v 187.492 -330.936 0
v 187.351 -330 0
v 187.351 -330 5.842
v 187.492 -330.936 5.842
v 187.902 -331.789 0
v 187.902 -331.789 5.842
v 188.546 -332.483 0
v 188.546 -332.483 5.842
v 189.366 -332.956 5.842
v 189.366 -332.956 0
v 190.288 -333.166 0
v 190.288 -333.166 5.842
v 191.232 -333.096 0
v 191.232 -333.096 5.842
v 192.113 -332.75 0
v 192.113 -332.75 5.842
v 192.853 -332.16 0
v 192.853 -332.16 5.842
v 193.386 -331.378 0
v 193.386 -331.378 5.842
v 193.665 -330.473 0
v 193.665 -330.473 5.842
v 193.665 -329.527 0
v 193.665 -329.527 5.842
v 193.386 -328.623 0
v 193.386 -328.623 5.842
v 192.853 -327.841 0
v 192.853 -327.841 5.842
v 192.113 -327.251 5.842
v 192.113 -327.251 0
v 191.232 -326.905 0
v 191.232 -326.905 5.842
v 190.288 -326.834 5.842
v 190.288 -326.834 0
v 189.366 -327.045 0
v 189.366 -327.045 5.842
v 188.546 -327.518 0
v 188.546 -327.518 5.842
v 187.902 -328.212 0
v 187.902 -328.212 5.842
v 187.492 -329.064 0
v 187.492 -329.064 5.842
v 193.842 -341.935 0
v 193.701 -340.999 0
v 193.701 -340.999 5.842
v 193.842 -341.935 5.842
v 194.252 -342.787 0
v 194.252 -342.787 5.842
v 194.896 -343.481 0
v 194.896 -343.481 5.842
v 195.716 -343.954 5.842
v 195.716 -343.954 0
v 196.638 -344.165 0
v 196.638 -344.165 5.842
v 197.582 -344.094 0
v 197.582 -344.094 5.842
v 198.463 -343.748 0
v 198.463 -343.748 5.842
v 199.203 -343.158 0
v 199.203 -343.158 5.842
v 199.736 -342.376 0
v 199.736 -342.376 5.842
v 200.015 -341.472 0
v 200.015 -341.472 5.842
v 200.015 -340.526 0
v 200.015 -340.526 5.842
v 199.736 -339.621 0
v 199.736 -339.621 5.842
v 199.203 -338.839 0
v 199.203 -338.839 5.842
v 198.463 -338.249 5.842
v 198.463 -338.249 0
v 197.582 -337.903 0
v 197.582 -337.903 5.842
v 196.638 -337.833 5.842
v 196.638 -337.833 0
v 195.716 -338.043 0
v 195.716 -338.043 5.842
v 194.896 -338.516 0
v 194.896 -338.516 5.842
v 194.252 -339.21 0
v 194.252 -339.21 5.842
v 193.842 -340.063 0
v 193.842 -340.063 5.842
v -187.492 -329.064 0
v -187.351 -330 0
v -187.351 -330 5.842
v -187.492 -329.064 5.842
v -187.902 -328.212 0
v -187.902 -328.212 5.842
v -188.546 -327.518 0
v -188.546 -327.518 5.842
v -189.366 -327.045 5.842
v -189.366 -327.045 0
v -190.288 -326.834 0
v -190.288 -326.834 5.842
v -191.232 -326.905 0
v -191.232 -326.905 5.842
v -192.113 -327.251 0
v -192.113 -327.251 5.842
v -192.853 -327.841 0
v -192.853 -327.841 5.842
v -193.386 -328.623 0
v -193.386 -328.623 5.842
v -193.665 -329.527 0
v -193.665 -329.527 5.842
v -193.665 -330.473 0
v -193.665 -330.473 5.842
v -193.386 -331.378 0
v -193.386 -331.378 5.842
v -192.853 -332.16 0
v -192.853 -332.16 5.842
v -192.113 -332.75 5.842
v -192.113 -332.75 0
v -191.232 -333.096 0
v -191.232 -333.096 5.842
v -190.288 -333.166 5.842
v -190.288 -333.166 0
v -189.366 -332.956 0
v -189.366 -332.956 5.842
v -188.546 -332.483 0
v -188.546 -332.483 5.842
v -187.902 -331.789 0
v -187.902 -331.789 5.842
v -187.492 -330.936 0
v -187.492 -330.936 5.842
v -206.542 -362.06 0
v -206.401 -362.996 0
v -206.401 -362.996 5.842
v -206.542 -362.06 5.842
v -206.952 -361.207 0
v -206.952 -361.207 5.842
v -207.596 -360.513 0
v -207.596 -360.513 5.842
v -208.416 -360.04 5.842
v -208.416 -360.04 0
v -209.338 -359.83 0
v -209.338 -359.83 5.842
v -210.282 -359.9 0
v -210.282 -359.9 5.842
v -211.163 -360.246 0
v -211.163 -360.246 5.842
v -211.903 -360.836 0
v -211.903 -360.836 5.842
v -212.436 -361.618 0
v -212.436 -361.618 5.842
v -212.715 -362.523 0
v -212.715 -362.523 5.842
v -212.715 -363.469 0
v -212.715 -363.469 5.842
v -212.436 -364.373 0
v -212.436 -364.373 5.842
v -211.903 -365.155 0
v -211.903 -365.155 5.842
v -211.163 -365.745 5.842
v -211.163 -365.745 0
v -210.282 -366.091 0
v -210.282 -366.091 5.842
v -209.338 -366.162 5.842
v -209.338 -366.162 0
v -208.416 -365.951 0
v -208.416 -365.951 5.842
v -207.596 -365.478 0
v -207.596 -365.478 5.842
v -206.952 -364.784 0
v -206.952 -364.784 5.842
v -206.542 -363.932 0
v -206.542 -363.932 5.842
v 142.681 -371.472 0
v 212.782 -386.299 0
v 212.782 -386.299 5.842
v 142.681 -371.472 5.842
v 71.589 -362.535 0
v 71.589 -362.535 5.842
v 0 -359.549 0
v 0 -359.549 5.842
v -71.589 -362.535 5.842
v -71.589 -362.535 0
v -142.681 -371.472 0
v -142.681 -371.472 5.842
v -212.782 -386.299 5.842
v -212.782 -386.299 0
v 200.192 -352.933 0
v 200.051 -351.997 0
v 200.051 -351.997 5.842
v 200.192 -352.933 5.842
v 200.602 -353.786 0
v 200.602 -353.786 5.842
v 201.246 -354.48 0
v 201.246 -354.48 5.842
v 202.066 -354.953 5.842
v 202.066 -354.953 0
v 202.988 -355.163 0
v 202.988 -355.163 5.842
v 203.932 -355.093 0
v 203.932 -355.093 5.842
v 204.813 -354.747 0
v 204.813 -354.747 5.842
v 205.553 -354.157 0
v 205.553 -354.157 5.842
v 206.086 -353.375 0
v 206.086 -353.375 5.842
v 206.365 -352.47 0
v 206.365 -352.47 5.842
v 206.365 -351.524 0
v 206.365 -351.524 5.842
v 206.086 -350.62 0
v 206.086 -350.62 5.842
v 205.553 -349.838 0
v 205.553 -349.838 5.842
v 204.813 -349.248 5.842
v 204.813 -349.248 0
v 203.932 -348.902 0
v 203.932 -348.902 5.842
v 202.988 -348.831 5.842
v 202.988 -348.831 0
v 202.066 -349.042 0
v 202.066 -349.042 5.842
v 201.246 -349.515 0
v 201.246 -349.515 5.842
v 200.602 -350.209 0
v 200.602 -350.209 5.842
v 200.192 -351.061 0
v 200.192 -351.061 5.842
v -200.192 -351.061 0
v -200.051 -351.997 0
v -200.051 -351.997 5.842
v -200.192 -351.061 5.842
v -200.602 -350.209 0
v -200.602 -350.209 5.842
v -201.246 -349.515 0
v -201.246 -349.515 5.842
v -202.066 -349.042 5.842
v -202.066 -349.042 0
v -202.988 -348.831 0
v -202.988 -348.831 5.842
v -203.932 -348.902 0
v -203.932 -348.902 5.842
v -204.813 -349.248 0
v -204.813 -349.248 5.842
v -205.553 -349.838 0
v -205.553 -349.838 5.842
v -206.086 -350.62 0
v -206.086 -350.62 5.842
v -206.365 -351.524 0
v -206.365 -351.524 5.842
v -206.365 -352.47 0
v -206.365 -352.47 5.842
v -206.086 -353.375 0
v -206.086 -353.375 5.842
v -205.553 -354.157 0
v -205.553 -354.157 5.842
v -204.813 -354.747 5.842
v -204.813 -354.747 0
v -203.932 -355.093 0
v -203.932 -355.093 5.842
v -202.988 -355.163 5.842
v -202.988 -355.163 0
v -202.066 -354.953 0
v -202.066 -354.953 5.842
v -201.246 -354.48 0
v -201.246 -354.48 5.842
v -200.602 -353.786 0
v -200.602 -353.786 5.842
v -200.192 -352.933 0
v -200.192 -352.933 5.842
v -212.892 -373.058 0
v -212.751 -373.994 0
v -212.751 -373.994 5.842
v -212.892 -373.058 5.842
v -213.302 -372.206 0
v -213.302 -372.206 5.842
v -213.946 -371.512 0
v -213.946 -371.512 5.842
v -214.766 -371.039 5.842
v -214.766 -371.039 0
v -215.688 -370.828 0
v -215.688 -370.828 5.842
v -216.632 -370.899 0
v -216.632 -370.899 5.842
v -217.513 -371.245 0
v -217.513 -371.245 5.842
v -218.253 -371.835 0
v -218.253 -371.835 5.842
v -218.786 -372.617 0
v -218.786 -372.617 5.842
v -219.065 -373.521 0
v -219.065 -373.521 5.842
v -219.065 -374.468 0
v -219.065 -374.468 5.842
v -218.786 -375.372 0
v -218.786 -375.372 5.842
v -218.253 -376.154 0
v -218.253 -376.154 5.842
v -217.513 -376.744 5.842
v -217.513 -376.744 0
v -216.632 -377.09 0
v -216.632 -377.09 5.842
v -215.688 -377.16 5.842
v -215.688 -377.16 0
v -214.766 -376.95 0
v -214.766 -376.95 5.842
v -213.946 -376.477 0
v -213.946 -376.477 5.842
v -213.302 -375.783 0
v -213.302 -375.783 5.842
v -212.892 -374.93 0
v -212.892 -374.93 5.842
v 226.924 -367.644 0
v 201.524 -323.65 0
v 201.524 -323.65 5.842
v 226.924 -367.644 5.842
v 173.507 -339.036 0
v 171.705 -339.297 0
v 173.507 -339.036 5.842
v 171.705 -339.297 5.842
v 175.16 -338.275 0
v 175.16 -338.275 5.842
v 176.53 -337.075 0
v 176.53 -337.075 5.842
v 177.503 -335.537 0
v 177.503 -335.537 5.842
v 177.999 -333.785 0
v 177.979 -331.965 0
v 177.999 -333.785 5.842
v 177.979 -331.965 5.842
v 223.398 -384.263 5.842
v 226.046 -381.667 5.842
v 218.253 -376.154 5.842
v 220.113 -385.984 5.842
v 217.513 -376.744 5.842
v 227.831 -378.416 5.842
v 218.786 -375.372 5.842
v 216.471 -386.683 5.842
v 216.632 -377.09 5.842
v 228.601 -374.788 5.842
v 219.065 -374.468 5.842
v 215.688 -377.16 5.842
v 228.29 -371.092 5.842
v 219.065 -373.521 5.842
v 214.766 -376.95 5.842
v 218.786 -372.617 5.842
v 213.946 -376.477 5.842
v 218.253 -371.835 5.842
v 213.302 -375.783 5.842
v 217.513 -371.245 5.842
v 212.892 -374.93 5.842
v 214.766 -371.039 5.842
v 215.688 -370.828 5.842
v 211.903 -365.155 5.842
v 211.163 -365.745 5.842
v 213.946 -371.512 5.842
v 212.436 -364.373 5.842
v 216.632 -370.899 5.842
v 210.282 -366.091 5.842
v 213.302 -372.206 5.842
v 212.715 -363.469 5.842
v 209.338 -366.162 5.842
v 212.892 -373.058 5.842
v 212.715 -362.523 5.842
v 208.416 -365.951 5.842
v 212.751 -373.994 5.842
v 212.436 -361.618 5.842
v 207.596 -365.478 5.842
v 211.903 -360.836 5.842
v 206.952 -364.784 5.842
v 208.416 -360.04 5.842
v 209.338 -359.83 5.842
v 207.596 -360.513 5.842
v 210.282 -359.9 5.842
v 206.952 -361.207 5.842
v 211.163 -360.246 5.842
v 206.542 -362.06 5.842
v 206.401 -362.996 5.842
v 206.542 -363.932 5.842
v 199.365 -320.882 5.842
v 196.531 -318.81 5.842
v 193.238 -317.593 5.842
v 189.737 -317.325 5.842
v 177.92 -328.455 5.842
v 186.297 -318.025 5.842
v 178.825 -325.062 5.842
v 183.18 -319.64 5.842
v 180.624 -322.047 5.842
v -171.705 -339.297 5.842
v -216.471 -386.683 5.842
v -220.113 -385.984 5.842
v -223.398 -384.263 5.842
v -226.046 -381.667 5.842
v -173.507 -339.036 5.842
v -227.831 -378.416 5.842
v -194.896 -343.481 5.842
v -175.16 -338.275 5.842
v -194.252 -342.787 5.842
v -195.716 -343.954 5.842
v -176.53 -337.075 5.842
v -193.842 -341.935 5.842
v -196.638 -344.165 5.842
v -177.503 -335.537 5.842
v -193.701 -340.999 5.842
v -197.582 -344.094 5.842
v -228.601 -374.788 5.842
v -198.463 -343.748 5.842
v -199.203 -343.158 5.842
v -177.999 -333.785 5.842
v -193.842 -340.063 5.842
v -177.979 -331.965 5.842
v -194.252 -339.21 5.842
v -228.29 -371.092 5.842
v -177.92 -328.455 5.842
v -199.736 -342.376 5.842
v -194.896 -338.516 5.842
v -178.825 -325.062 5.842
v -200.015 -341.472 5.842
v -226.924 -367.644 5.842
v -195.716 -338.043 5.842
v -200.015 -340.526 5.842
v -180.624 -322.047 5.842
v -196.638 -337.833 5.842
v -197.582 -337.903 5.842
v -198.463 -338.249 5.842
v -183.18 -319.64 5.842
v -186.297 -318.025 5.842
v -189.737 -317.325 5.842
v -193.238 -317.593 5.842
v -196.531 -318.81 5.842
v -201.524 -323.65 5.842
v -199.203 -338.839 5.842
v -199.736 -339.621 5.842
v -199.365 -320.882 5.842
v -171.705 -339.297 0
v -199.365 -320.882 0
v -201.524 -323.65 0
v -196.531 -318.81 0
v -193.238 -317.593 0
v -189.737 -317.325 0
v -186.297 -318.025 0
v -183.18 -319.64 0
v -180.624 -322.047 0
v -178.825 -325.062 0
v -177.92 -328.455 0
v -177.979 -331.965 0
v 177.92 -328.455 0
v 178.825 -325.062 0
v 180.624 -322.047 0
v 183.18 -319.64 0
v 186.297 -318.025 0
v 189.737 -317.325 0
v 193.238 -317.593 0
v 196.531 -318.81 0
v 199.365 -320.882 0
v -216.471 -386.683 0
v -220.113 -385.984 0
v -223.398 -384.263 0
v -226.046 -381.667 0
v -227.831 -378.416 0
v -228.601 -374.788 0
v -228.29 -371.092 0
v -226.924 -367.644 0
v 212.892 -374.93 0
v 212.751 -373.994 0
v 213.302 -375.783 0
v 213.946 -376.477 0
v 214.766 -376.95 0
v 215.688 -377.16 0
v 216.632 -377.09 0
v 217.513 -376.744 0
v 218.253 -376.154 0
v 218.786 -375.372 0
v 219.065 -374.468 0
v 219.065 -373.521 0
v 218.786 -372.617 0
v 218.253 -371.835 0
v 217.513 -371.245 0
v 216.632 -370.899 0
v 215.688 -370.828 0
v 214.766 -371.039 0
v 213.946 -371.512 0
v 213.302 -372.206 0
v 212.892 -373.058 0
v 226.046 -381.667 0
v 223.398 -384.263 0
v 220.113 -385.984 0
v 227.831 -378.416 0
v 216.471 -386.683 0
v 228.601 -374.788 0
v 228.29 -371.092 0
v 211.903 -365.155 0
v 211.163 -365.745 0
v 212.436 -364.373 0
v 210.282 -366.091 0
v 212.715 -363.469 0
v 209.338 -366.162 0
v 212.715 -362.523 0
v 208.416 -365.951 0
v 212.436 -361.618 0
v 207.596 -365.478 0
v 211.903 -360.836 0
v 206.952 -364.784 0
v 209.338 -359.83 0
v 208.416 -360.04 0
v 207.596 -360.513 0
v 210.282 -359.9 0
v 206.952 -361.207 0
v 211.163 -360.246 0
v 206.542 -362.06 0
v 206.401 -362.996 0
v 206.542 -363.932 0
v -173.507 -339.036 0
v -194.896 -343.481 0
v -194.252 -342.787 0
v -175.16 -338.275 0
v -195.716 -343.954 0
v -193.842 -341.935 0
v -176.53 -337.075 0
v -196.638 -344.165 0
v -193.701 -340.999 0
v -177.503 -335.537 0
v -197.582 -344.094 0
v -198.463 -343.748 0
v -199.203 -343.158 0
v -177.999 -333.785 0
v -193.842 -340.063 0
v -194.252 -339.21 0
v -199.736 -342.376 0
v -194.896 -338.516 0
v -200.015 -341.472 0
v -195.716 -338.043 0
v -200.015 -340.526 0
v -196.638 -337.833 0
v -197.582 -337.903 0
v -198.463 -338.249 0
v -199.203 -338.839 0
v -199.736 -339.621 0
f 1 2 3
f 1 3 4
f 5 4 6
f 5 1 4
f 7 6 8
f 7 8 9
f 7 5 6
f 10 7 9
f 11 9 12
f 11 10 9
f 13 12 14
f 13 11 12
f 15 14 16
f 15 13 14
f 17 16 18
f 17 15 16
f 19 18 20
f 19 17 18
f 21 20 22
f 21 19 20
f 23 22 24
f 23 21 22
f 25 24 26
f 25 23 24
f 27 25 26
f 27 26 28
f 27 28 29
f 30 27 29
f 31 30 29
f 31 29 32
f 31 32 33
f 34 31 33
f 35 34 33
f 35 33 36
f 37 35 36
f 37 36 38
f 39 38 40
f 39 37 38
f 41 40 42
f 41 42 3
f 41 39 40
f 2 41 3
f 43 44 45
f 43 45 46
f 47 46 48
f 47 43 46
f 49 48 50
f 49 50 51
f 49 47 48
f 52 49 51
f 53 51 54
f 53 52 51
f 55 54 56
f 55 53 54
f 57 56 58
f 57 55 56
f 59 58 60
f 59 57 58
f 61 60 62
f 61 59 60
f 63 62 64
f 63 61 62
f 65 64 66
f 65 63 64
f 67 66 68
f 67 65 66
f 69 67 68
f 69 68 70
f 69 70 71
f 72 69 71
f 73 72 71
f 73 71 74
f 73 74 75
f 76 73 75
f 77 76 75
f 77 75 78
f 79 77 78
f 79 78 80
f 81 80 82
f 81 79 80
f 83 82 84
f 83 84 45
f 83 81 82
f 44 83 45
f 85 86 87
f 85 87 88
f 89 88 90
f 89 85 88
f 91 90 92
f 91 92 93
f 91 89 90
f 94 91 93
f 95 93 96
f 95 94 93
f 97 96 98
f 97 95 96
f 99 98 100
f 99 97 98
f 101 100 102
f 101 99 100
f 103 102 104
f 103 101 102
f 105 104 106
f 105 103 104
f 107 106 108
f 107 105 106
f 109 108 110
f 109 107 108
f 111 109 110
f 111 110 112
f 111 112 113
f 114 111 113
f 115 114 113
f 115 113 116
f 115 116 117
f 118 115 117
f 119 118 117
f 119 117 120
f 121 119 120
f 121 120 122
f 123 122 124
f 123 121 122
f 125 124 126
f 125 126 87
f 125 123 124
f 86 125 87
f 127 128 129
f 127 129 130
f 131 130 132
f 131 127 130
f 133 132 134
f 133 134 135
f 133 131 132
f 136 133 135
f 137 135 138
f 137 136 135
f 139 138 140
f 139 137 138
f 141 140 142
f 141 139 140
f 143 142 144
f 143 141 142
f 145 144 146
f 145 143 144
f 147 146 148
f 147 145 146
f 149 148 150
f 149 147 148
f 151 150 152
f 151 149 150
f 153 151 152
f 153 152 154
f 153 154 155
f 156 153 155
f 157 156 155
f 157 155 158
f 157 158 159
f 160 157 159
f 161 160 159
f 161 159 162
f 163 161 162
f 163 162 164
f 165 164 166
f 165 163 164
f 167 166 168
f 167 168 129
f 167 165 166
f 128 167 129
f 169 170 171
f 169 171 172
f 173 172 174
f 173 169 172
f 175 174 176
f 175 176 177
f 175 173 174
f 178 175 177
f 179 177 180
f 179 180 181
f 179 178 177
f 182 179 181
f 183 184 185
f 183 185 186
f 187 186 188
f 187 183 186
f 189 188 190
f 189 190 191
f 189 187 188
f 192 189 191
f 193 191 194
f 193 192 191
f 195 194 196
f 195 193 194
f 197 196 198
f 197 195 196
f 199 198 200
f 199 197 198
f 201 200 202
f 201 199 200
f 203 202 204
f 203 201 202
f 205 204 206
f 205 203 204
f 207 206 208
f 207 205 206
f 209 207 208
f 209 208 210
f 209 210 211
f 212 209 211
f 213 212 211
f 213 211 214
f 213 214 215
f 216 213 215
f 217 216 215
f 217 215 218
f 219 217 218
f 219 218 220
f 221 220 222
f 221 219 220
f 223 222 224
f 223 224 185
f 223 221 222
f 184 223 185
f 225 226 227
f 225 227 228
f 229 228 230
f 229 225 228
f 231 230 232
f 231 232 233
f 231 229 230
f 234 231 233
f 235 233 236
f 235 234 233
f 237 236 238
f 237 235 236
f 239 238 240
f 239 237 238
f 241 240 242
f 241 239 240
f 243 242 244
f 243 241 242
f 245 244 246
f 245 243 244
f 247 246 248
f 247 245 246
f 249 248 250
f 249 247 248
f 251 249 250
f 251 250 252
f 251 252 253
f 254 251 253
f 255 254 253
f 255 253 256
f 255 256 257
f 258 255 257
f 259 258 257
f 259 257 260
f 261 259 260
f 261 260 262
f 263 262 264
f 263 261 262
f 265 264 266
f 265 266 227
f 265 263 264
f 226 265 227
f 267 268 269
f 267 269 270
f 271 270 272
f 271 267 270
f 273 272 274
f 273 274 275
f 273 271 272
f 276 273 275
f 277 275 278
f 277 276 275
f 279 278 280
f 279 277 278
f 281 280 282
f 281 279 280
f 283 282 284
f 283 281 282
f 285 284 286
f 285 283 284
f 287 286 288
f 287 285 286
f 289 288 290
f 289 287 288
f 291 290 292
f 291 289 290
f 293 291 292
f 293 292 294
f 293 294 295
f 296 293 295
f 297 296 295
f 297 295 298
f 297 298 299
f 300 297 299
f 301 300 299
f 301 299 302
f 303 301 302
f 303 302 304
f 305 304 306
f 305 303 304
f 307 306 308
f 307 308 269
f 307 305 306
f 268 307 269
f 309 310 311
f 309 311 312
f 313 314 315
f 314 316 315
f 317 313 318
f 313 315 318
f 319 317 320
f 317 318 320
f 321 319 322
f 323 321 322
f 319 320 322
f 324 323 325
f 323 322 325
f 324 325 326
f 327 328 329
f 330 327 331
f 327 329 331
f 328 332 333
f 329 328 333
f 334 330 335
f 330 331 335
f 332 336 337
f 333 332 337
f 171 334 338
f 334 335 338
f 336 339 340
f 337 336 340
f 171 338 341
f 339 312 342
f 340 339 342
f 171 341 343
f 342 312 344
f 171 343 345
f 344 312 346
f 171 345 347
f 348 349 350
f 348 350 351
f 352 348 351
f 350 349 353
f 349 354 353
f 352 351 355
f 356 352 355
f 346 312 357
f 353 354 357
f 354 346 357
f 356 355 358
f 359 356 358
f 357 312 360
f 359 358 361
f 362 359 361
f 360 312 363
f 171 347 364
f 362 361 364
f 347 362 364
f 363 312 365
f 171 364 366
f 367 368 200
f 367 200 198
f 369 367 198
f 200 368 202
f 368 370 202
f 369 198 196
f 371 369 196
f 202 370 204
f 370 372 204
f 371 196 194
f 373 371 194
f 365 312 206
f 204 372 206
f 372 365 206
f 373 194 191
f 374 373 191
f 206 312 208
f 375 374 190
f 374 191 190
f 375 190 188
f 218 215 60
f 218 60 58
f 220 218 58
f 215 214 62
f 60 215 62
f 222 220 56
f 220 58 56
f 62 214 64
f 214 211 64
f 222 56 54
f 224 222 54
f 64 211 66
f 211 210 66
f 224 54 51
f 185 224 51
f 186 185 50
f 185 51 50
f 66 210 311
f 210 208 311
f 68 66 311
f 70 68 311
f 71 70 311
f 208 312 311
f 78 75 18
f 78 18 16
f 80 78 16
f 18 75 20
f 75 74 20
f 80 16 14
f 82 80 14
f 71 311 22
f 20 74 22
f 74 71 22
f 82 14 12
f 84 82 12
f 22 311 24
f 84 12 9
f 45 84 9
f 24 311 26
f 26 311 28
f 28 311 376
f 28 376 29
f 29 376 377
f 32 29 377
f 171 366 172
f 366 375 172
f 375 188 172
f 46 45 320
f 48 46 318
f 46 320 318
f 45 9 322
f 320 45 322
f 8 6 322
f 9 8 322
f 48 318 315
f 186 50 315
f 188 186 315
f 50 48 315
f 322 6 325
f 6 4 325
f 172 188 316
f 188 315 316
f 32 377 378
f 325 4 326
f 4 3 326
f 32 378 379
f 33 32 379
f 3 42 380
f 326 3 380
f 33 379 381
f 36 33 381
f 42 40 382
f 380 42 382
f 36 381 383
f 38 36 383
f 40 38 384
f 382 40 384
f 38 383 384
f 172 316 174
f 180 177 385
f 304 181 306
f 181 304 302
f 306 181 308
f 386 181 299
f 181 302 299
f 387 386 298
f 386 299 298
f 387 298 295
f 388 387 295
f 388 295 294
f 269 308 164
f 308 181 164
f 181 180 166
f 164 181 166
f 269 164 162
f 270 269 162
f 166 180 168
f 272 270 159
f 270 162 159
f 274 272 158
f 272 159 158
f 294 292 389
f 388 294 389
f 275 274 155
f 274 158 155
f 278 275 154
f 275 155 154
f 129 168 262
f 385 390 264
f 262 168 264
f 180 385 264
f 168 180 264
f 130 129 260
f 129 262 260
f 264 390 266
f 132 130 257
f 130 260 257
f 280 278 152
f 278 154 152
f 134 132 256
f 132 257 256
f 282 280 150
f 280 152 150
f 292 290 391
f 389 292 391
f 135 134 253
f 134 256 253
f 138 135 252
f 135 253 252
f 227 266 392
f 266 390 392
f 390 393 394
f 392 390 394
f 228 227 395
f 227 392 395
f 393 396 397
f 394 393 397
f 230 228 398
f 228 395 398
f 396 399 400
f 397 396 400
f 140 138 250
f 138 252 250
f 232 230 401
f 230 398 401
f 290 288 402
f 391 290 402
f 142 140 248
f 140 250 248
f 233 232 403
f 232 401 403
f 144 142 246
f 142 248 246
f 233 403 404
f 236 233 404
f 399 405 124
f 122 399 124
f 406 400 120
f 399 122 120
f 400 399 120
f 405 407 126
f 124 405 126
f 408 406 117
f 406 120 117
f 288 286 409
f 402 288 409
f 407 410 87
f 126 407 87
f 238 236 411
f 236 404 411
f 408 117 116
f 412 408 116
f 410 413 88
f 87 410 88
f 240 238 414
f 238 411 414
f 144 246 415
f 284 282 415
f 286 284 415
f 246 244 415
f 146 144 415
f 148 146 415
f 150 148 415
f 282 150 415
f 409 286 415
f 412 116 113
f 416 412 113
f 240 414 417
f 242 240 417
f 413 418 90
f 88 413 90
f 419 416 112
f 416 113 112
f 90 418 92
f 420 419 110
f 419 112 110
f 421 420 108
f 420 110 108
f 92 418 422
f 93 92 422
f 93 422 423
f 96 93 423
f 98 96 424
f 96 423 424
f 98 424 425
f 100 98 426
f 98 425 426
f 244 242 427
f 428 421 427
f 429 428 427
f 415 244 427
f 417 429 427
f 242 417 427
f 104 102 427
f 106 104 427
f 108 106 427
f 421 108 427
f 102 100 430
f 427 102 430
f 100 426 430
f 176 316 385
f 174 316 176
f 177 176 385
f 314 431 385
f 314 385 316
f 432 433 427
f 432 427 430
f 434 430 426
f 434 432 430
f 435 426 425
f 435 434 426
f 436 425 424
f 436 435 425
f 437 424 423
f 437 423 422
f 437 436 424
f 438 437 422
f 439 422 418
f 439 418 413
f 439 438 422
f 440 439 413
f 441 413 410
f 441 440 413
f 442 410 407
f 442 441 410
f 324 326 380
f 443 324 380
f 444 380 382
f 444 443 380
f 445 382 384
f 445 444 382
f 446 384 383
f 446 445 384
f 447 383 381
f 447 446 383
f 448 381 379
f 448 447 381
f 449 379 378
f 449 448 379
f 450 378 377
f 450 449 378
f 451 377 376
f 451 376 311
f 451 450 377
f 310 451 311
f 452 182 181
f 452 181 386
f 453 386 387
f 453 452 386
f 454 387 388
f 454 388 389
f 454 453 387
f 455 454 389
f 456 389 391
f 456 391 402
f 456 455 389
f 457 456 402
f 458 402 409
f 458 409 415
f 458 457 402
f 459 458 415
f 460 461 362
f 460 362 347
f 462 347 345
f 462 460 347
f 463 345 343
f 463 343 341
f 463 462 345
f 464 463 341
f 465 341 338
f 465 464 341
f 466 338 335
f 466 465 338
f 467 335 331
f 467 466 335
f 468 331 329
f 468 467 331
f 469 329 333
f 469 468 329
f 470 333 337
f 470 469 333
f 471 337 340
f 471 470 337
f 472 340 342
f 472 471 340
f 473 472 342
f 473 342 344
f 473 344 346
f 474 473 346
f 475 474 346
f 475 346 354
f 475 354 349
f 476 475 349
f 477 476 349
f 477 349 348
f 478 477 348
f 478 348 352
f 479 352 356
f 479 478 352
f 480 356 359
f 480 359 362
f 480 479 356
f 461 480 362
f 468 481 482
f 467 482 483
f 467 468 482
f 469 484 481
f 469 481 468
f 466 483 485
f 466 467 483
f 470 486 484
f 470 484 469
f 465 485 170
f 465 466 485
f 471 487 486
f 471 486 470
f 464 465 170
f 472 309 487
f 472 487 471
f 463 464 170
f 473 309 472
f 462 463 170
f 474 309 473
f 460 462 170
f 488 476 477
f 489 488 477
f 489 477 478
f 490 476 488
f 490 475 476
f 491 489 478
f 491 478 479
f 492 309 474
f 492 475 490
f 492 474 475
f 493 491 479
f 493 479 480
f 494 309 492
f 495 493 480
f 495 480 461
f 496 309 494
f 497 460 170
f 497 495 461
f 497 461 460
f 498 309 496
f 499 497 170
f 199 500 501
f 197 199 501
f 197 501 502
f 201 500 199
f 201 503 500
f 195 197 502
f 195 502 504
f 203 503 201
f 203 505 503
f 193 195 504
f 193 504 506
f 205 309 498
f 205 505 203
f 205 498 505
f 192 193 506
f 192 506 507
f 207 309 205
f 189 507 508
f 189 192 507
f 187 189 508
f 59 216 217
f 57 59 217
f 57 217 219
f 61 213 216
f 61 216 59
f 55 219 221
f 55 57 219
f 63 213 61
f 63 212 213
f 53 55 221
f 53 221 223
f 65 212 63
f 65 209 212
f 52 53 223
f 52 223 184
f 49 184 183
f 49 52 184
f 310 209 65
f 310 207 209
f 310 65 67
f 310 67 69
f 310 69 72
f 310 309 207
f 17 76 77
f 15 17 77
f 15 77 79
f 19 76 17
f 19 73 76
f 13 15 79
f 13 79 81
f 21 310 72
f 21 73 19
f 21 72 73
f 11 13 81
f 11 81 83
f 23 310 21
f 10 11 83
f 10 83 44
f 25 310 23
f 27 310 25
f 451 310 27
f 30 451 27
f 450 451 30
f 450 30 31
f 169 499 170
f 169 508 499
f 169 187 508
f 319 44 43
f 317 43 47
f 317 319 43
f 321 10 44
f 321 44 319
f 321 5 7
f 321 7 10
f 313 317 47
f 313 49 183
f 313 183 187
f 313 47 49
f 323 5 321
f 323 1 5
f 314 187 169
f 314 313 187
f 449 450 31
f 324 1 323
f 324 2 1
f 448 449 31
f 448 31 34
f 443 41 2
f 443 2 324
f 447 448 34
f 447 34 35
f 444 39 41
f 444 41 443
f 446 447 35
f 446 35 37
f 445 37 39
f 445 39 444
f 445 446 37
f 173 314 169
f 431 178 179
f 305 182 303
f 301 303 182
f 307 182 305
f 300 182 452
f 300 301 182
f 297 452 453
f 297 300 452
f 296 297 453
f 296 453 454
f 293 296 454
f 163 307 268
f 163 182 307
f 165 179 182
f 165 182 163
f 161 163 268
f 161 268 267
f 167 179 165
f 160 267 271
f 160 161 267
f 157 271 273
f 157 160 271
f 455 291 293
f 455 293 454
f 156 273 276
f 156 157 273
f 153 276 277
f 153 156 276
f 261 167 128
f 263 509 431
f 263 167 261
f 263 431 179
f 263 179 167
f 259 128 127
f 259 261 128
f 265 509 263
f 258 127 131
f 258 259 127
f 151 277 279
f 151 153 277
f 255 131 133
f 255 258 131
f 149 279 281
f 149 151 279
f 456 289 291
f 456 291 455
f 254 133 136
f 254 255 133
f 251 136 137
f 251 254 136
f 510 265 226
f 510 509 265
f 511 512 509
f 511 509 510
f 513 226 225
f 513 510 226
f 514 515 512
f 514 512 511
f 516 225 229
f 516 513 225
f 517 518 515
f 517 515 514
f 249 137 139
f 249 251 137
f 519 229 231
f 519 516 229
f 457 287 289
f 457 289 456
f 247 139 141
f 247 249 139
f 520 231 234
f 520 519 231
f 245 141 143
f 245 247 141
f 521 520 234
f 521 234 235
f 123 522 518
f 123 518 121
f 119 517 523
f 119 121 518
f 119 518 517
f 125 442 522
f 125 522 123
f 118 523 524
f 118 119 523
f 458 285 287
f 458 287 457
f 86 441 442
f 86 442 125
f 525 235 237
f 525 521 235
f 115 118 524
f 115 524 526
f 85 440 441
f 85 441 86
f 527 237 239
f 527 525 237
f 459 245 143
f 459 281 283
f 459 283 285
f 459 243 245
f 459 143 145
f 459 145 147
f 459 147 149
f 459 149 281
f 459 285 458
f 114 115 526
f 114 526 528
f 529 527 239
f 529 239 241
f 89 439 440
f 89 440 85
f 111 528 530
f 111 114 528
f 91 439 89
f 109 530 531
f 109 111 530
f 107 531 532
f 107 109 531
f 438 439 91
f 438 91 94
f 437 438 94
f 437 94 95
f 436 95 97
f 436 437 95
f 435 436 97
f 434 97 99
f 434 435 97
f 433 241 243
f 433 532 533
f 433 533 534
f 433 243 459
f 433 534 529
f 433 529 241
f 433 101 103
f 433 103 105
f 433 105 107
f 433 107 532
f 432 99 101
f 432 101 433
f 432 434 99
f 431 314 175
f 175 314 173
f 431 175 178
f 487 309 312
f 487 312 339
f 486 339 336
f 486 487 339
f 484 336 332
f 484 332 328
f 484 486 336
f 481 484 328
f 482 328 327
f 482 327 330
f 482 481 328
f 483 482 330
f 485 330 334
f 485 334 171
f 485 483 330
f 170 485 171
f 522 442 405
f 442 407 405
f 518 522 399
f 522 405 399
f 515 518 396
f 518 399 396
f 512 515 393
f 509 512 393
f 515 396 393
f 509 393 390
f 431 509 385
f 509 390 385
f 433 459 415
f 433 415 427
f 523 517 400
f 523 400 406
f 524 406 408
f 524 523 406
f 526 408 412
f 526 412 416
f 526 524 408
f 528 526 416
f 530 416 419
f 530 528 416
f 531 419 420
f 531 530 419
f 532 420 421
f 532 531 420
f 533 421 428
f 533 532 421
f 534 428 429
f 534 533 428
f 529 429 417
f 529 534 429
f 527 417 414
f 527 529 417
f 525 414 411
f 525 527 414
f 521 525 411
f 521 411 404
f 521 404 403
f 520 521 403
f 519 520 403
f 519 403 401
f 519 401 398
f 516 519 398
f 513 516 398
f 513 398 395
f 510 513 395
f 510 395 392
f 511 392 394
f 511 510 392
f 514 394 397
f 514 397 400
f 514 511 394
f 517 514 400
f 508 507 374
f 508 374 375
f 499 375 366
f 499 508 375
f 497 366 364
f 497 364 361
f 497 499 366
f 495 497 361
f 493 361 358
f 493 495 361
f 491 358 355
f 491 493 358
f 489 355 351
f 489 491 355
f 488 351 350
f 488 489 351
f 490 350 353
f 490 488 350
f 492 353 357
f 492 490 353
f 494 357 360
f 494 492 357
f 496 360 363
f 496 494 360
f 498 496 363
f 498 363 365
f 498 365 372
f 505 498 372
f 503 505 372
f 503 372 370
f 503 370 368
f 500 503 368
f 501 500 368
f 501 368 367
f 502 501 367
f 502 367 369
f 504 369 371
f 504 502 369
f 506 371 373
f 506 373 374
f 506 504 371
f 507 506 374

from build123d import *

# Parameters (mm, degrees)
SKETCH1_R           = 3.175
BOSS_EXTRUDE1_DEPTH = 5.842
FILLET1_R           = 6.35


with BuildPart() as part:
    # Sketch1 → Boss-Extrude1 (new body)
    with BuildSketch(Plane.XY):
        with BuildLine():
            Line((-226.924230888, -367.644297366), (-214.224230888, -345.64725211))
            Line((-214.224230888, -345.64725211), (-201.524230888, -323.650206854))
            ThreePointArc((-201.524230888, -323.650206854), (-182.614690973, -320.065127313), (-181.873832769, -339.29725211))
            Line((-181.873832769, -339.29725211), (181.873832769, -339.29725211))
            ThreePointArc((181.873832769, -339.29725211), (182.614690973, -320.065127313), (201.524230888, -323.650206854))
            Line((201.524230888, -323.650206854), (214.224230888, -345.64725211))
            Line((214.224230888, -345.64725211), (226.924230888, -367.644297366))
            ThreePointArc((226.924230888, -367.644297366), (226.046266682, -381.666604531), (212.782184711, -386.299103732))
            ThreePointArc((212.782184711, -386.299103732), (0, -359.548814266), (-212.782184711, -386.299103732))
            ThreePointArc((-212.782184711, -386.299103732), (-226.046266682, -381.666604531), (-226.924230888, -367.644297366))
        make_face()
        with Locations((-203.22570826, -351.99725211)):
            Circle(SKETCH1_R, mode=Mode.SUBTRACT)
        with Locations((-209.57570826, -362.995774738)):
            Circle(SKETCH1_R, mode=Mode.SUBTRACT)
        with Locations((-215.92570826, -373.994297366)):
            Circle(SKETCH1_R, mode=Mode.SUBTRACT)
        with Locations(Location((196.87570826, -340.998729482, 0), (0, 0, 180))):
            Circle(SKETCH1_R, mode=Mode.SUBTRACT)
        with Locations(Location((203.22570826, -351.99725211, 0), (0, 0, 180))):
            Circle(SKETCH1_R, mode=Mode.SUBTRACT)
        with Locations(Location((209.57570826, -362.995774738, 0), (0, 0, 180))):
            Circle(SKETCH1_R, mode=Mode.SUBTRACT)
        with Locations(Location((215.92570826, -373.994297366, 0), (0, 0, 180))):
            Circle(SKETCH1_R, mode=Mode.SUBTRACT)
        with Locations((-196.87570826, -340.998729482)):
            Circle(SKETCH1_R, mode=Mode.SUBTRACT)
        with Locations((-190.52570826, -330.000206854)):
            Circle(SKETCH1_R, mode=Mode.SUBTRACT)
        with Locations(Location((190.52570826, -330.000206854, 0), (0, 0, 180))):
            Circle(SKETCH1_R, mode=Mode.SUBTRACT)
    extrude(amount=BOSS_EXTRUDE1_DEPTH)

    # Fillet1
    fillet1_edges = [part.edges().sort_by_distance(p)[0] for p in [
        (-181.873832769, -339.29725211, 2.921),
        (181.873832769, -339.29725211, 2.921),
    ]]
    fillet(fillet1_edges, radius=FILLET1_R)


solid = part.part
